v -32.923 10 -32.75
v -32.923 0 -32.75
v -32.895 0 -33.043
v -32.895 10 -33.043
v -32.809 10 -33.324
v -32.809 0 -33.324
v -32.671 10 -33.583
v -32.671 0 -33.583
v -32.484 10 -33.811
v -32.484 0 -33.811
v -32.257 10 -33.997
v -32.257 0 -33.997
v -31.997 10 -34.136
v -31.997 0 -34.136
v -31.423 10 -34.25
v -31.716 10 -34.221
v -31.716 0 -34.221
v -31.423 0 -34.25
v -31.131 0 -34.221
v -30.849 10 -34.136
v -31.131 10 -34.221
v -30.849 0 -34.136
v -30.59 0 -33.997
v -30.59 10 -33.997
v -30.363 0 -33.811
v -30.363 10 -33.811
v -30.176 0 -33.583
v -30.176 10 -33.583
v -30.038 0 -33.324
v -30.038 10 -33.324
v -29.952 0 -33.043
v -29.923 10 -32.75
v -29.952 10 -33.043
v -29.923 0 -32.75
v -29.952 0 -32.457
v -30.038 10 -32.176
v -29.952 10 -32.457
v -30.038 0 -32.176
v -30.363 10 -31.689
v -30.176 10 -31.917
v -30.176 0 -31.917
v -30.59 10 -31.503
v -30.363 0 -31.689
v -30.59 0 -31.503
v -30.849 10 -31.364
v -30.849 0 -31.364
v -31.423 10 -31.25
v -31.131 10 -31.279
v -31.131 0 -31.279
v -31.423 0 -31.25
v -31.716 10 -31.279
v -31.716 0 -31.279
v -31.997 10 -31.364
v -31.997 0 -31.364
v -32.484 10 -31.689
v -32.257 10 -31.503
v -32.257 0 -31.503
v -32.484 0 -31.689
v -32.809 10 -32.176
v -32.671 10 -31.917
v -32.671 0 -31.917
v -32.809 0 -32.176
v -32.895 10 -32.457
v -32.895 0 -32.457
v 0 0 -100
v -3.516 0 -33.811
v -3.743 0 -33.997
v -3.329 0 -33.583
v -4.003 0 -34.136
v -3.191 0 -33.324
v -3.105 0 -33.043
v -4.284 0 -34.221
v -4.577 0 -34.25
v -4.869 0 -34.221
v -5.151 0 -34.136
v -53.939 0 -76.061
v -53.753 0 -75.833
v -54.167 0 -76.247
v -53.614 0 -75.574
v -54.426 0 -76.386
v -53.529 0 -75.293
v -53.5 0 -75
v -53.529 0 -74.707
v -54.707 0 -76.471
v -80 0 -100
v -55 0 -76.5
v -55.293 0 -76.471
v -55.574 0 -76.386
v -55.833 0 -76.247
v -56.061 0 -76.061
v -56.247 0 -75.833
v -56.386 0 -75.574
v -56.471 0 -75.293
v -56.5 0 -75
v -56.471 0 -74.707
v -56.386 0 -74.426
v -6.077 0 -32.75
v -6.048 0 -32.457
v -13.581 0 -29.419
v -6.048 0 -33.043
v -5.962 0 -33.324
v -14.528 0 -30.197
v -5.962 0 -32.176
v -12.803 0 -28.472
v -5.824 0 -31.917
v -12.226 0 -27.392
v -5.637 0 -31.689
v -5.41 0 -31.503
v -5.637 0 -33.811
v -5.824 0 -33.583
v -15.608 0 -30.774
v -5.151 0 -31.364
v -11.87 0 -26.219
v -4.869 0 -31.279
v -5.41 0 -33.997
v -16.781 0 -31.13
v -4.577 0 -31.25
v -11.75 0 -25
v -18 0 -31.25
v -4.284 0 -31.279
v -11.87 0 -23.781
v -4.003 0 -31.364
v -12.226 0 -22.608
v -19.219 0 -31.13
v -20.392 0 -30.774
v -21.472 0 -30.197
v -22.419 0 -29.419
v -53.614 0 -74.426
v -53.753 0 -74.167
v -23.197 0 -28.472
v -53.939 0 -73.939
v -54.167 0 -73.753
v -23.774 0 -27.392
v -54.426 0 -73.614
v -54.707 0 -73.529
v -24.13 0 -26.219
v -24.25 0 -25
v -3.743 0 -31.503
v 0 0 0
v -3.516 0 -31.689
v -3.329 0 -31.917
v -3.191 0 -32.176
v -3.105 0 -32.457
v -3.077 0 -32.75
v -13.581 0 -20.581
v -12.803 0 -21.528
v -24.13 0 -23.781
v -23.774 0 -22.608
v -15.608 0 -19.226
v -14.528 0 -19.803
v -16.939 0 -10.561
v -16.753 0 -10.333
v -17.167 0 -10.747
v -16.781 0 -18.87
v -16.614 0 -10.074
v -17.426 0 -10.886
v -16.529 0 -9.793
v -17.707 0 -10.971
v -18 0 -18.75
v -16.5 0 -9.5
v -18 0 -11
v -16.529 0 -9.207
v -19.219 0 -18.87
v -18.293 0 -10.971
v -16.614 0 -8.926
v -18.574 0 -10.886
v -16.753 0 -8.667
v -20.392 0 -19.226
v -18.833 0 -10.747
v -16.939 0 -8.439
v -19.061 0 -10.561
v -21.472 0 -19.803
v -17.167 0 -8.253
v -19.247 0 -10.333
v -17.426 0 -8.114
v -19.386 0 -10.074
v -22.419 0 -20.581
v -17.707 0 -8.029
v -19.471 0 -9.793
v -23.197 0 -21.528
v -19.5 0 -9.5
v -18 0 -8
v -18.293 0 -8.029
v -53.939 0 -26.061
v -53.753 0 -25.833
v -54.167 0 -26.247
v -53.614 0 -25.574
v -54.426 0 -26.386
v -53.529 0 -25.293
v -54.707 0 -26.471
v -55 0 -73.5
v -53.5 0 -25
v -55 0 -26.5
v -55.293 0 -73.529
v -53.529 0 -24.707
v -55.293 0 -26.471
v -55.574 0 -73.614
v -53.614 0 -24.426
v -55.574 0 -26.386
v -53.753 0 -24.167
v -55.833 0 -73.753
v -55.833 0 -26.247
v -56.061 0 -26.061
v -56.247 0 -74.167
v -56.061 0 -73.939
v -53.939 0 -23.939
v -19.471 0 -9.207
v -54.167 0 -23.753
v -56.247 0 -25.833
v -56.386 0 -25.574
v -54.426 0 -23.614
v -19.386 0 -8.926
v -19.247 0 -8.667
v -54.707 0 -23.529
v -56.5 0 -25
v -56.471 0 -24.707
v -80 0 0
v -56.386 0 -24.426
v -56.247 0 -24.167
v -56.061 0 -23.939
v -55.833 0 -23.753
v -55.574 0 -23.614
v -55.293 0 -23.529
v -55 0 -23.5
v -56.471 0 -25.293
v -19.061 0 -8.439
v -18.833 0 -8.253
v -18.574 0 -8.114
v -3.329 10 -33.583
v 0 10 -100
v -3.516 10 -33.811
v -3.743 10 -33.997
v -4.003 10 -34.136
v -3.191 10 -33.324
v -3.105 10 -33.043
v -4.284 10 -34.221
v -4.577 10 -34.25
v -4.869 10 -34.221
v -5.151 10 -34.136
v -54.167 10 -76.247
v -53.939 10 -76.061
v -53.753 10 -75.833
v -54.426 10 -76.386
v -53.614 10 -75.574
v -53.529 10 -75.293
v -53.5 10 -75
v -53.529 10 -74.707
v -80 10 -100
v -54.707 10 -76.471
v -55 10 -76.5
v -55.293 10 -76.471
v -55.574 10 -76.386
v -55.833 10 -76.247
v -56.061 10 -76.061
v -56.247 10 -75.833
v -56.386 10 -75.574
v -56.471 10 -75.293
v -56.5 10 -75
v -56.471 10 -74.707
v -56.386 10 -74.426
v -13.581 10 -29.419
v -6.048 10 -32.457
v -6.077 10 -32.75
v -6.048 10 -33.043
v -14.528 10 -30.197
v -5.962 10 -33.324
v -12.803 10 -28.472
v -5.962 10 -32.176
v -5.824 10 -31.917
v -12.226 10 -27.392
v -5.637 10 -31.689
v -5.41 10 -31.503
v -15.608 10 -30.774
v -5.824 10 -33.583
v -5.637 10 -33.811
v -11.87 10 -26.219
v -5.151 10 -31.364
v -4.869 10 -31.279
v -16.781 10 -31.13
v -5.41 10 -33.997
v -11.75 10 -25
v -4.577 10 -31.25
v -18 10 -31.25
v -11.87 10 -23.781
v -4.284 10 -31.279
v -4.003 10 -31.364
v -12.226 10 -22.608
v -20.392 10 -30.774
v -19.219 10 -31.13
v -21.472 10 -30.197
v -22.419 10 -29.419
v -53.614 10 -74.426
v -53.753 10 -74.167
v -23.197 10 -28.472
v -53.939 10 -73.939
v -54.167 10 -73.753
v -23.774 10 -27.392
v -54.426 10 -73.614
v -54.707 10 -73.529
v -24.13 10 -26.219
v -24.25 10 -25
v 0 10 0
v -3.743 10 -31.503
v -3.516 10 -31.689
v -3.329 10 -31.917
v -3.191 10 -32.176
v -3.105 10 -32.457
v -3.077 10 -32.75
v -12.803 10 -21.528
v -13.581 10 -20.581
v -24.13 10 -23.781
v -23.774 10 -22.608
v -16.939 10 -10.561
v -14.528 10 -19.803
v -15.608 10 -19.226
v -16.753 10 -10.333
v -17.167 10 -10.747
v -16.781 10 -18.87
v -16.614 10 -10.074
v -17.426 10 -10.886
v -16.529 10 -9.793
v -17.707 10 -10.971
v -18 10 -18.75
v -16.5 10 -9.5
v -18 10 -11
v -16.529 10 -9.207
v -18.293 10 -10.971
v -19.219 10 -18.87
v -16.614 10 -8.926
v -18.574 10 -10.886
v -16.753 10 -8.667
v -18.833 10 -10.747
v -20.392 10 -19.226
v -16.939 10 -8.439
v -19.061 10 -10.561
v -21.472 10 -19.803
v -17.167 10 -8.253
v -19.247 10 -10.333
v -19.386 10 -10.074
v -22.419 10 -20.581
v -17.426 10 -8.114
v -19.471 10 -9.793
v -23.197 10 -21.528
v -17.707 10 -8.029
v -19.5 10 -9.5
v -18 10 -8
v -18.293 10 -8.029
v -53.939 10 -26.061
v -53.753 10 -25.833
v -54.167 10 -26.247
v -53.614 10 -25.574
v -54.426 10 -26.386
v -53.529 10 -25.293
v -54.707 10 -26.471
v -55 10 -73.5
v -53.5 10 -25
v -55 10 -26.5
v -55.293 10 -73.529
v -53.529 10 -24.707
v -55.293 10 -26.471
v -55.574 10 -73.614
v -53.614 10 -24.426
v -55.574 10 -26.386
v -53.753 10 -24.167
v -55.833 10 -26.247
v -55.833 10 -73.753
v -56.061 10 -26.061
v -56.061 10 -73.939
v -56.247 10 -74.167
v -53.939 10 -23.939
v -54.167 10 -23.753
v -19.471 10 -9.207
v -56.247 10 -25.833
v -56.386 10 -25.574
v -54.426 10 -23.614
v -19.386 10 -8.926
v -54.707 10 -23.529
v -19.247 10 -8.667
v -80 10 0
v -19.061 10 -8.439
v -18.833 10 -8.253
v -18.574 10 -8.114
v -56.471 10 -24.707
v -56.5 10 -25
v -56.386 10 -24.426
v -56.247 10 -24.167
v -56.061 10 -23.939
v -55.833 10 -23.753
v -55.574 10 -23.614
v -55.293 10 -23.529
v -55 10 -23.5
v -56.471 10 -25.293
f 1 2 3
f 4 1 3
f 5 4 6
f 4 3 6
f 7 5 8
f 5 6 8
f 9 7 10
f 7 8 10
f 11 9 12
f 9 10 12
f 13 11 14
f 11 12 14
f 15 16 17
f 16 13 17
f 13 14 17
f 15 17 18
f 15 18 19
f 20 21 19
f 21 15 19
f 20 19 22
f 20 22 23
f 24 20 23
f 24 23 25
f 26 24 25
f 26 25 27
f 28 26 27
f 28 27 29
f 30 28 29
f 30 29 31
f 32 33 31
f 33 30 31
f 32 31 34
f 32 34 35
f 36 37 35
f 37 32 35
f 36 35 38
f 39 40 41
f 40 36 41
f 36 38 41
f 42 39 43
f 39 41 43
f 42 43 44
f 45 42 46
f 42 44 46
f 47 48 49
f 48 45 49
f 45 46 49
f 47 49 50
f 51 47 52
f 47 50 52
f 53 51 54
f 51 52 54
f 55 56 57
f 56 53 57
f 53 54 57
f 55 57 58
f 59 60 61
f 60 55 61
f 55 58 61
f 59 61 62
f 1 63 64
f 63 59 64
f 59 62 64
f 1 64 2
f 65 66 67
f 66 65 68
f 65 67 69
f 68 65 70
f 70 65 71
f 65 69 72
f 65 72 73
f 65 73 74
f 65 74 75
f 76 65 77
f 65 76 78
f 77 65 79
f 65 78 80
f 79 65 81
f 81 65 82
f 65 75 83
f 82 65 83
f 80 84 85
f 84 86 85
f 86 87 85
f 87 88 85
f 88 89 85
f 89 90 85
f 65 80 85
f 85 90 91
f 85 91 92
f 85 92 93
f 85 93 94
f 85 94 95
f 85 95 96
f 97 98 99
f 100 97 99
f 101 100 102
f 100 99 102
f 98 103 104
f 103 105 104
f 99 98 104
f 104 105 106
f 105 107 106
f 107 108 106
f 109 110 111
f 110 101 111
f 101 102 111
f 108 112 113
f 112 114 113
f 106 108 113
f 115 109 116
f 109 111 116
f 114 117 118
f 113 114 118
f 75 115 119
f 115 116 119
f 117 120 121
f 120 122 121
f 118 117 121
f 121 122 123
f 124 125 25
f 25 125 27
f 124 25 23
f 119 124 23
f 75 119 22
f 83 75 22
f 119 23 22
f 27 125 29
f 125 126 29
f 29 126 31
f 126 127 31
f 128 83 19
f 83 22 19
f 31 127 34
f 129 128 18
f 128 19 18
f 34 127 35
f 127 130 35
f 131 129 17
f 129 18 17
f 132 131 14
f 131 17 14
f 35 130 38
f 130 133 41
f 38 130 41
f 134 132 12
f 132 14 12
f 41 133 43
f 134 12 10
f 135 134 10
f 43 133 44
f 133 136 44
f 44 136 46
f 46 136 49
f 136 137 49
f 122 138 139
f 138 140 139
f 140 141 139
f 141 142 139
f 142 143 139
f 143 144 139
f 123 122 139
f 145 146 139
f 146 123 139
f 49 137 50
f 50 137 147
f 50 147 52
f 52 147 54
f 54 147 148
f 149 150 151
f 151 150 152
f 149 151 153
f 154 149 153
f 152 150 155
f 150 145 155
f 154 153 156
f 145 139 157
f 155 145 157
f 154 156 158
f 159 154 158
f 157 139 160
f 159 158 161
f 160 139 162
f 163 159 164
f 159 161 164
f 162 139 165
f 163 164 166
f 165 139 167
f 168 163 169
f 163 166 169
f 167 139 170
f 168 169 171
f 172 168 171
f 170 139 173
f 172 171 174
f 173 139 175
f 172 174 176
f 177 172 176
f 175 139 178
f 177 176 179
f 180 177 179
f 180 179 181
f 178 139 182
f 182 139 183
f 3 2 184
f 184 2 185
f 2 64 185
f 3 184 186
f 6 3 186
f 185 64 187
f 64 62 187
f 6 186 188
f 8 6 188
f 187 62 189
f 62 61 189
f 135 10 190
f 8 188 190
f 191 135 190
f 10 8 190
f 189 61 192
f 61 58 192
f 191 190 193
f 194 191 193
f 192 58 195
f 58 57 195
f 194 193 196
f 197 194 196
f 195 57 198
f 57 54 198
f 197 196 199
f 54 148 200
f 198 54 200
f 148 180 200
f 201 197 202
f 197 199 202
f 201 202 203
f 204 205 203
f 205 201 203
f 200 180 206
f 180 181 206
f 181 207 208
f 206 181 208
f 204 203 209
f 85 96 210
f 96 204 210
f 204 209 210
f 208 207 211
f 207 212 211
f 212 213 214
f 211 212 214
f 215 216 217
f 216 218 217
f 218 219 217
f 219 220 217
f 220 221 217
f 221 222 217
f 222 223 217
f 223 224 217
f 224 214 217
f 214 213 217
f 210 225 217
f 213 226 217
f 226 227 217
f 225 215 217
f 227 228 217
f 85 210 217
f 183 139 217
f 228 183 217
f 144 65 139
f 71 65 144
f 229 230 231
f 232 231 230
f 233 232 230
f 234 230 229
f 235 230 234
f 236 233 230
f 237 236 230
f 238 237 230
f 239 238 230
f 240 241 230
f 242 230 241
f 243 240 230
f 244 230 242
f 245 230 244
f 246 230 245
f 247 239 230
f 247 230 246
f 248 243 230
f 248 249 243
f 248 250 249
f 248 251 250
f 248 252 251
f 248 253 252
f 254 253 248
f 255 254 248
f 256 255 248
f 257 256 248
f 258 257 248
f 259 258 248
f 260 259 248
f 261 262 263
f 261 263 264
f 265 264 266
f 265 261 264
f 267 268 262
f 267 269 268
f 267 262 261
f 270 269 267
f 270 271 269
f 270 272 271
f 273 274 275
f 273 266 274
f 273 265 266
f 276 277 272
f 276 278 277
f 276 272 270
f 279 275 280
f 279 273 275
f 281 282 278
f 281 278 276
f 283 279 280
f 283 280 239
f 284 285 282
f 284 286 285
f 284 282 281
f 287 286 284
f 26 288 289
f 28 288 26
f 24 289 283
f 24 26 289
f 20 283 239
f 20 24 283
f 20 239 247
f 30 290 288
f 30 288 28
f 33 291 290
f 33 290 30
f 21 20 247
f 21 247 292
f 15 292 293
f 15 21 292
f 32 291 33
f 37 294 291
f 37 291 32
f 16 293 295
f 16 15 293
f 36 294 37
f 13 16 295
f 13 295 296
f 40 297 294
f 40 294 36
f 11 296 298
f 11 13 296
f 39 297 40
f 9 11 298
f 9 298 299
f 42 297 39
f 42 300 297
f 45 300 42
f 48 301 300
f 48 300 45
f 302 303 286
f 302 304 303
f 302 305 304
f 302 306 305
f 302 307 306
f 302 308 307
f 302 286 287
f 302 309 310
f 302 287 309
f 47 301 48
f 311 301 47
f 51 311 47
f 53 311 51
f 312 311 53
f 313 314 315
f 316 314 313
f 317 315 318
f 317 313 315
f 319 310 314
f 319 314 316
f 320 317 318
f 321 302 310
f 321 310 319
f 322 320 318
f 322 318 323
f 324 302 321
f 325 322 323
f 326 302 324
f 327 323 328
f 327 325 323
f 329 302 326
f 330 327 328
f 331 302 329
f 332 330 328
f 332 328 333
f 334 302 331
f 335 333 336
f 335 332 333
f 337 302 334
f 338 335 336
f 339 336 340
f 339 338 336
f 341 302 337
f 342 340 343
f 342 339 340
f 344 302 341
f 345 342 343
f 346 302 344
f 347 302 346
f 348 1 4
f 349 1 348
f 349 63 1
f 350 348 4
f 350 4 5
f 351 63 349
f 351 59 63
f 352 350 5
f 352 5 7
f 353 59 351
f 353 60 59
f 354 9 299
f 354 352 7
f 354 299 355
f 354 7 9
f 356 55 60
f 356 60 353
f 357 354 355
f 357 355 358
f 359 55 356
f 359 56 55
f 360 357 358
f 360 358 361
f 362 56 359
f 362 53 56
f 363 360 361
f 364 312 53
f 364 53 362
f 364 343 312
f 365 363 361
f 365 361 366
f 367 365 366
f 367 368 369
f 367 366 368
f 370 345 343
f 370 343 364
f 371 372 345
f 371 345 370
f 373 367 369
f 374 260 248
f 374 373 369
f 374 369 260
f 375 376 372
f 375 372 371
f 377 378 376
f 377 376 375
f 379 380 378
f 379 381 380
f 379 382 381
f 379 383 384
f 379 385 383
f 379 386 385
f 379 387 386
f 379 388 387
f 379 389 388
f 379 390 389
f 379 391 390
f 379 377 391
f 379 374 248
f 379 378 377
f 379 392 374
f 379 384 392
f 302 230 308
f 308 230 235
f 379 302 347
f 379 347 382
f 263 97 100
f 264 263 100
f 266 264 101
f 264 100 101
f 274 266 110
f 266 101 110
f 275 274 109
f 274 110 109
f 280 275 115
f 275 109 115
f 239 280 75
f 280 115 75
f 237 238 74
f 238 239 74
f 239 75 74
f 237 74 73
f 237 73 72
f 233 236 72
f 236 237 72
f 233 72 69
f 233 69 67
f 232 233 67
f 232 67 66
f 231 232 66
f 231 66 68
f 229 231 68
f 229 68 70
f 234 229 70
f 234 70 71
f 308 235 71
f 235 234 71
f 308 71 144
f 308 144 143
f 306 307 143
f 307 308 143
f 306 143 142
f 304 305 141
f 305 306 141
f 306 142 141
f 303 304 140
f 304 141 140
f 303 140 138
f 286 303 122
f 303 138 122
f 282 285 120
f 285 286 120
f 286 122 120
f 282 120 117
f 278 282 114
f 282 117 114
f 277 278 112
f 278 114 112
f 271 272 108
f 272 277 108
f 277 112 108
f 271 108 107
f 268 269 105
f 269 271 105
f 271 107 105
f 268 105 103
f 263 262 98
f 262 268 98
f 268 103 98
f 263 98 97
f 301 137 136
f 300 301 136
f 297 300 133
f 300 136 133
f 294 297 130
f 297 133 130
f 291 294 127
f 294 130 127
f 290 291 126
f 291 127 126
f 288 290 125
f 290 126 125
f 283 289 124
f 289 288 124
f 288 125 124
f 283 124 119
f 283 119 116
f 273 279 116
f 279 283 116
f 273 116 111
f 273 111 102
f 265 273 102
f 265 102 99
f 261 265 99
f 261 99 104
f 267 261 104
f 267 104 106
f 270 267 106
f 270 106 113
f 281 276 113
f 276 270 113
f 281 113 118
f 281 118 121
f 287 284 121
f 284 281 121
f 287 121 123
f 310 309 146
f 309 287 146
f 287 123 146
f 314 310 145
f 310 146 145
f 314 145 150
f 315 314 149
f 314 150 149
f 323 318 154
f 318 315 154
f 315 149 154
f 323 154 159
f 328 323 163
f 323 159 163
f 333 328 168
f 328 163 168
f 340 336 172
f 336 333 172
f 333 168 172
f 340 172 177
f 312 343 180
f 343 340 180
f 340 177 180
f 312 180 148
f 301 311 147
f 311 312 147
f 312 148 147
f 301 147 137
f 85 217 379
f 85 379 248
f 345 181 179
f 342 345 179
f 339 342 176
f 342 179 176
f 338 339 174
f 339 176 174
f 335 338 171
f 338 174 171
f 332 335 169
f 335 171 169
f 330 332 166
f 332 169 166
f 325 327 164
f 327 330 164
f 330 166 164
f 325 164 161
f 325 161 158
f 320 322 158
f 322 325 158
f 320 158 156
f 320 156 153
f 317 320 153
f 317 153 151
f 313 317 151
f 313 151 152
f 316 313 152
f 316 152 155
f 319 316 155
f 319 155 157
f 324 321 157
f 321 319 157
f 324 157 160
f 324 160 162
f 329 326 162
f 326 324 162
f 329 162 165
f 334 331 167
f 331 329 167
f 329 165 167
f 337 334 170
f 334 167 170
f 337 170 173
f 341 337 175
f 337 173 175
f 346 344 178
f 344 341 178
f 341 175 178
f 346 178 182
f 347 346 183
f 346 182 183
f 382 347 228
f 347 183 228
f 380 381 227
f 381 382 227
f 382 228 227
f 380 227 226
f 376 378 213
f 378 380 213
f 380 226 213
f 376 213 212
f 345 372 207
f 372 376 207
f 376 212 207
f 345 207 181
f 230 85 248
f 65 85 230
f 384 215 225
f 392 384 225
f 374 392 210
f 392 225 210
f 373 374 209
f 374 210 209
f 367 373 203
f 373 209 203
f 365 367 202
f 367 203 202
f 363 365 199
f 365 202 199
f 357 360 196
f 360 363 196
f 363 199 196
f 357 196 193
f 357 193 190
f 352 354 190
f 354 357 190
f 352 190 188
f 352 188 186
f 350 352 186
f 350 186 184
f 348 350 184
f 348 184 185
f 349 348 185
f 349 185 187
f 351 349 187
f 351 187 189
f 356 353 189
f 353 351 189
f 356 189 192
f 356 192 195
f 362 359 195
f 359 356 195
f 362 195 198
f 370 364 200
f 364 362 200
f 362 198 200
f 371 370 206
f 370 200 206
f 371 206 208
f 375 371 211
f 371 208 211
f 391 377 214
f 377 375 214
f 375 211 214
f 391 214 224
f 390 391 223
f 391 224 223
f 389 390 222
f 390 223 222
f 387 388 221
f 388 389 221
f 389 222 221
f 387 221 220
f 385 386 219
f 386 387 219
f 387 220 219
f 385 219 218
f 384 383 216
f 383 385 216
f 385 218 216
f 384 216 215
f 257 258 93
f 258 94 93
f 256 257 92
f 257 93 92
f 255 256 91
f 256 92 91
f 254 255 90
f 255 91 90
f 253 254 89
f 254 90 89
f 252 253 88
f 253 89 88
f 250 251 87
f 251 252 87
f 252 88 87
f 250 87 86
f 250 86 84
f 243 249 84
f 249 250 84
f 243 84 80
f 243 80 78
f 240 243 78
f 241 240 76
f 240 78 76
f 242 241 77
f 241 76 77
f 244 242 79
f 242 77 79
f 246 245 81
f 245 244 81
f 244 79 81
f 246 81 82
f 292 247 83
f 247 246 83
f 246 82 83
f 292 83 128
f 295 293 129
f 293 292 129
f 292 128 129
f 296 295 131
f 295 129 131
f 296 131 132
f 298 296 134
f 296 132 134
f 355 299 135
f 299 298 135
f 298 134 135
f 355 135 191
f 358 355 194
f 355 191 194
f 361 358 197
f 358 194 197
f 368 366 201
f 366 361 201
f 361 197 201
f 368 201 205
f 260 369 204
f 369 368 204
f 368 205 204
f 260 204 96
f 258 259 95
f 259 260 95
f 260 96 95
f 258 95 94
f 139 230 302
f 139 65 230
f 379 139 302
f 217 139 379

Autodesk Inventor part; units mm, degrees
ref_plane "YZ Plane" through (0, 0, 0) normal (1, 0, 0) x (0, 1, 0)
ref_plane "XZ Plane" through (0, 0, 0) normal (0, 1, 0) x (-1, 0, 0)
ref_plane "XY Plane" through (0, 0, 0) normal (0, 0, 1) x (1, 0, 0)
sketch "Sketch1" plane through (0, 0, 0) normal (0, 1, 0) x (-1, 0, 0)
  line L0 (0, 0) -> (80, 0)
  line L1 (80, 0) -> (80, -100)
  line L2 (80, -100) -> (0, -100)
  line L3 (0, -100) -> (0, 0)
  line L4 (55, 12.5326) -> (55, -107.8943) construction
  circle A0 centre (55, -25) radius 1.5
  circle A1 centre (55, -75) radius 1.5
  line L5 (55, -25) -> (18, -25) construction
  circle A2 centre (18, -25) radius 1.5
  circle A3 centre (18, -25) radius 6.25
  circle A4 centre (18, -9.5) radius 1.5
  circle A5 centre (4.5766, -32.75) radius 1.5
  circle A6 centre (31.4234, -32.75) radius 1.5
  dimension "d2" = 25
  dimension "d3" = 3
  dimension "d4" = 3
  dimension "d5" = 25
  dimension "d6" = 50
  dimension "d7" = 37
  dimension "d8" = 3
  dimension "d9" = 100
  dimension "d10" = 80
  dimension "d13" = 12.5
  dimension "d16" = 3
  dimension "d17" = 15.5
  dimension "d20" = 360
  dimension "d22" = 12.5326
  dimension "d23" = 107.8943
  dimension "d27" = 48.5766
extrude "Extrusion1" add sketch "Sketch1" along normal blind 10 contours L0 L1 L2 L3 | A3 | A4 | A5 | A6
extrude "Extrusion2" cut sketch "Sketch1" along normal blind 10 contours A3
extrude "Extrusion3" cut sketch "Sketch1" along normal blind 10 contours A4 | A5 | A6
properties part number "Support test1"
